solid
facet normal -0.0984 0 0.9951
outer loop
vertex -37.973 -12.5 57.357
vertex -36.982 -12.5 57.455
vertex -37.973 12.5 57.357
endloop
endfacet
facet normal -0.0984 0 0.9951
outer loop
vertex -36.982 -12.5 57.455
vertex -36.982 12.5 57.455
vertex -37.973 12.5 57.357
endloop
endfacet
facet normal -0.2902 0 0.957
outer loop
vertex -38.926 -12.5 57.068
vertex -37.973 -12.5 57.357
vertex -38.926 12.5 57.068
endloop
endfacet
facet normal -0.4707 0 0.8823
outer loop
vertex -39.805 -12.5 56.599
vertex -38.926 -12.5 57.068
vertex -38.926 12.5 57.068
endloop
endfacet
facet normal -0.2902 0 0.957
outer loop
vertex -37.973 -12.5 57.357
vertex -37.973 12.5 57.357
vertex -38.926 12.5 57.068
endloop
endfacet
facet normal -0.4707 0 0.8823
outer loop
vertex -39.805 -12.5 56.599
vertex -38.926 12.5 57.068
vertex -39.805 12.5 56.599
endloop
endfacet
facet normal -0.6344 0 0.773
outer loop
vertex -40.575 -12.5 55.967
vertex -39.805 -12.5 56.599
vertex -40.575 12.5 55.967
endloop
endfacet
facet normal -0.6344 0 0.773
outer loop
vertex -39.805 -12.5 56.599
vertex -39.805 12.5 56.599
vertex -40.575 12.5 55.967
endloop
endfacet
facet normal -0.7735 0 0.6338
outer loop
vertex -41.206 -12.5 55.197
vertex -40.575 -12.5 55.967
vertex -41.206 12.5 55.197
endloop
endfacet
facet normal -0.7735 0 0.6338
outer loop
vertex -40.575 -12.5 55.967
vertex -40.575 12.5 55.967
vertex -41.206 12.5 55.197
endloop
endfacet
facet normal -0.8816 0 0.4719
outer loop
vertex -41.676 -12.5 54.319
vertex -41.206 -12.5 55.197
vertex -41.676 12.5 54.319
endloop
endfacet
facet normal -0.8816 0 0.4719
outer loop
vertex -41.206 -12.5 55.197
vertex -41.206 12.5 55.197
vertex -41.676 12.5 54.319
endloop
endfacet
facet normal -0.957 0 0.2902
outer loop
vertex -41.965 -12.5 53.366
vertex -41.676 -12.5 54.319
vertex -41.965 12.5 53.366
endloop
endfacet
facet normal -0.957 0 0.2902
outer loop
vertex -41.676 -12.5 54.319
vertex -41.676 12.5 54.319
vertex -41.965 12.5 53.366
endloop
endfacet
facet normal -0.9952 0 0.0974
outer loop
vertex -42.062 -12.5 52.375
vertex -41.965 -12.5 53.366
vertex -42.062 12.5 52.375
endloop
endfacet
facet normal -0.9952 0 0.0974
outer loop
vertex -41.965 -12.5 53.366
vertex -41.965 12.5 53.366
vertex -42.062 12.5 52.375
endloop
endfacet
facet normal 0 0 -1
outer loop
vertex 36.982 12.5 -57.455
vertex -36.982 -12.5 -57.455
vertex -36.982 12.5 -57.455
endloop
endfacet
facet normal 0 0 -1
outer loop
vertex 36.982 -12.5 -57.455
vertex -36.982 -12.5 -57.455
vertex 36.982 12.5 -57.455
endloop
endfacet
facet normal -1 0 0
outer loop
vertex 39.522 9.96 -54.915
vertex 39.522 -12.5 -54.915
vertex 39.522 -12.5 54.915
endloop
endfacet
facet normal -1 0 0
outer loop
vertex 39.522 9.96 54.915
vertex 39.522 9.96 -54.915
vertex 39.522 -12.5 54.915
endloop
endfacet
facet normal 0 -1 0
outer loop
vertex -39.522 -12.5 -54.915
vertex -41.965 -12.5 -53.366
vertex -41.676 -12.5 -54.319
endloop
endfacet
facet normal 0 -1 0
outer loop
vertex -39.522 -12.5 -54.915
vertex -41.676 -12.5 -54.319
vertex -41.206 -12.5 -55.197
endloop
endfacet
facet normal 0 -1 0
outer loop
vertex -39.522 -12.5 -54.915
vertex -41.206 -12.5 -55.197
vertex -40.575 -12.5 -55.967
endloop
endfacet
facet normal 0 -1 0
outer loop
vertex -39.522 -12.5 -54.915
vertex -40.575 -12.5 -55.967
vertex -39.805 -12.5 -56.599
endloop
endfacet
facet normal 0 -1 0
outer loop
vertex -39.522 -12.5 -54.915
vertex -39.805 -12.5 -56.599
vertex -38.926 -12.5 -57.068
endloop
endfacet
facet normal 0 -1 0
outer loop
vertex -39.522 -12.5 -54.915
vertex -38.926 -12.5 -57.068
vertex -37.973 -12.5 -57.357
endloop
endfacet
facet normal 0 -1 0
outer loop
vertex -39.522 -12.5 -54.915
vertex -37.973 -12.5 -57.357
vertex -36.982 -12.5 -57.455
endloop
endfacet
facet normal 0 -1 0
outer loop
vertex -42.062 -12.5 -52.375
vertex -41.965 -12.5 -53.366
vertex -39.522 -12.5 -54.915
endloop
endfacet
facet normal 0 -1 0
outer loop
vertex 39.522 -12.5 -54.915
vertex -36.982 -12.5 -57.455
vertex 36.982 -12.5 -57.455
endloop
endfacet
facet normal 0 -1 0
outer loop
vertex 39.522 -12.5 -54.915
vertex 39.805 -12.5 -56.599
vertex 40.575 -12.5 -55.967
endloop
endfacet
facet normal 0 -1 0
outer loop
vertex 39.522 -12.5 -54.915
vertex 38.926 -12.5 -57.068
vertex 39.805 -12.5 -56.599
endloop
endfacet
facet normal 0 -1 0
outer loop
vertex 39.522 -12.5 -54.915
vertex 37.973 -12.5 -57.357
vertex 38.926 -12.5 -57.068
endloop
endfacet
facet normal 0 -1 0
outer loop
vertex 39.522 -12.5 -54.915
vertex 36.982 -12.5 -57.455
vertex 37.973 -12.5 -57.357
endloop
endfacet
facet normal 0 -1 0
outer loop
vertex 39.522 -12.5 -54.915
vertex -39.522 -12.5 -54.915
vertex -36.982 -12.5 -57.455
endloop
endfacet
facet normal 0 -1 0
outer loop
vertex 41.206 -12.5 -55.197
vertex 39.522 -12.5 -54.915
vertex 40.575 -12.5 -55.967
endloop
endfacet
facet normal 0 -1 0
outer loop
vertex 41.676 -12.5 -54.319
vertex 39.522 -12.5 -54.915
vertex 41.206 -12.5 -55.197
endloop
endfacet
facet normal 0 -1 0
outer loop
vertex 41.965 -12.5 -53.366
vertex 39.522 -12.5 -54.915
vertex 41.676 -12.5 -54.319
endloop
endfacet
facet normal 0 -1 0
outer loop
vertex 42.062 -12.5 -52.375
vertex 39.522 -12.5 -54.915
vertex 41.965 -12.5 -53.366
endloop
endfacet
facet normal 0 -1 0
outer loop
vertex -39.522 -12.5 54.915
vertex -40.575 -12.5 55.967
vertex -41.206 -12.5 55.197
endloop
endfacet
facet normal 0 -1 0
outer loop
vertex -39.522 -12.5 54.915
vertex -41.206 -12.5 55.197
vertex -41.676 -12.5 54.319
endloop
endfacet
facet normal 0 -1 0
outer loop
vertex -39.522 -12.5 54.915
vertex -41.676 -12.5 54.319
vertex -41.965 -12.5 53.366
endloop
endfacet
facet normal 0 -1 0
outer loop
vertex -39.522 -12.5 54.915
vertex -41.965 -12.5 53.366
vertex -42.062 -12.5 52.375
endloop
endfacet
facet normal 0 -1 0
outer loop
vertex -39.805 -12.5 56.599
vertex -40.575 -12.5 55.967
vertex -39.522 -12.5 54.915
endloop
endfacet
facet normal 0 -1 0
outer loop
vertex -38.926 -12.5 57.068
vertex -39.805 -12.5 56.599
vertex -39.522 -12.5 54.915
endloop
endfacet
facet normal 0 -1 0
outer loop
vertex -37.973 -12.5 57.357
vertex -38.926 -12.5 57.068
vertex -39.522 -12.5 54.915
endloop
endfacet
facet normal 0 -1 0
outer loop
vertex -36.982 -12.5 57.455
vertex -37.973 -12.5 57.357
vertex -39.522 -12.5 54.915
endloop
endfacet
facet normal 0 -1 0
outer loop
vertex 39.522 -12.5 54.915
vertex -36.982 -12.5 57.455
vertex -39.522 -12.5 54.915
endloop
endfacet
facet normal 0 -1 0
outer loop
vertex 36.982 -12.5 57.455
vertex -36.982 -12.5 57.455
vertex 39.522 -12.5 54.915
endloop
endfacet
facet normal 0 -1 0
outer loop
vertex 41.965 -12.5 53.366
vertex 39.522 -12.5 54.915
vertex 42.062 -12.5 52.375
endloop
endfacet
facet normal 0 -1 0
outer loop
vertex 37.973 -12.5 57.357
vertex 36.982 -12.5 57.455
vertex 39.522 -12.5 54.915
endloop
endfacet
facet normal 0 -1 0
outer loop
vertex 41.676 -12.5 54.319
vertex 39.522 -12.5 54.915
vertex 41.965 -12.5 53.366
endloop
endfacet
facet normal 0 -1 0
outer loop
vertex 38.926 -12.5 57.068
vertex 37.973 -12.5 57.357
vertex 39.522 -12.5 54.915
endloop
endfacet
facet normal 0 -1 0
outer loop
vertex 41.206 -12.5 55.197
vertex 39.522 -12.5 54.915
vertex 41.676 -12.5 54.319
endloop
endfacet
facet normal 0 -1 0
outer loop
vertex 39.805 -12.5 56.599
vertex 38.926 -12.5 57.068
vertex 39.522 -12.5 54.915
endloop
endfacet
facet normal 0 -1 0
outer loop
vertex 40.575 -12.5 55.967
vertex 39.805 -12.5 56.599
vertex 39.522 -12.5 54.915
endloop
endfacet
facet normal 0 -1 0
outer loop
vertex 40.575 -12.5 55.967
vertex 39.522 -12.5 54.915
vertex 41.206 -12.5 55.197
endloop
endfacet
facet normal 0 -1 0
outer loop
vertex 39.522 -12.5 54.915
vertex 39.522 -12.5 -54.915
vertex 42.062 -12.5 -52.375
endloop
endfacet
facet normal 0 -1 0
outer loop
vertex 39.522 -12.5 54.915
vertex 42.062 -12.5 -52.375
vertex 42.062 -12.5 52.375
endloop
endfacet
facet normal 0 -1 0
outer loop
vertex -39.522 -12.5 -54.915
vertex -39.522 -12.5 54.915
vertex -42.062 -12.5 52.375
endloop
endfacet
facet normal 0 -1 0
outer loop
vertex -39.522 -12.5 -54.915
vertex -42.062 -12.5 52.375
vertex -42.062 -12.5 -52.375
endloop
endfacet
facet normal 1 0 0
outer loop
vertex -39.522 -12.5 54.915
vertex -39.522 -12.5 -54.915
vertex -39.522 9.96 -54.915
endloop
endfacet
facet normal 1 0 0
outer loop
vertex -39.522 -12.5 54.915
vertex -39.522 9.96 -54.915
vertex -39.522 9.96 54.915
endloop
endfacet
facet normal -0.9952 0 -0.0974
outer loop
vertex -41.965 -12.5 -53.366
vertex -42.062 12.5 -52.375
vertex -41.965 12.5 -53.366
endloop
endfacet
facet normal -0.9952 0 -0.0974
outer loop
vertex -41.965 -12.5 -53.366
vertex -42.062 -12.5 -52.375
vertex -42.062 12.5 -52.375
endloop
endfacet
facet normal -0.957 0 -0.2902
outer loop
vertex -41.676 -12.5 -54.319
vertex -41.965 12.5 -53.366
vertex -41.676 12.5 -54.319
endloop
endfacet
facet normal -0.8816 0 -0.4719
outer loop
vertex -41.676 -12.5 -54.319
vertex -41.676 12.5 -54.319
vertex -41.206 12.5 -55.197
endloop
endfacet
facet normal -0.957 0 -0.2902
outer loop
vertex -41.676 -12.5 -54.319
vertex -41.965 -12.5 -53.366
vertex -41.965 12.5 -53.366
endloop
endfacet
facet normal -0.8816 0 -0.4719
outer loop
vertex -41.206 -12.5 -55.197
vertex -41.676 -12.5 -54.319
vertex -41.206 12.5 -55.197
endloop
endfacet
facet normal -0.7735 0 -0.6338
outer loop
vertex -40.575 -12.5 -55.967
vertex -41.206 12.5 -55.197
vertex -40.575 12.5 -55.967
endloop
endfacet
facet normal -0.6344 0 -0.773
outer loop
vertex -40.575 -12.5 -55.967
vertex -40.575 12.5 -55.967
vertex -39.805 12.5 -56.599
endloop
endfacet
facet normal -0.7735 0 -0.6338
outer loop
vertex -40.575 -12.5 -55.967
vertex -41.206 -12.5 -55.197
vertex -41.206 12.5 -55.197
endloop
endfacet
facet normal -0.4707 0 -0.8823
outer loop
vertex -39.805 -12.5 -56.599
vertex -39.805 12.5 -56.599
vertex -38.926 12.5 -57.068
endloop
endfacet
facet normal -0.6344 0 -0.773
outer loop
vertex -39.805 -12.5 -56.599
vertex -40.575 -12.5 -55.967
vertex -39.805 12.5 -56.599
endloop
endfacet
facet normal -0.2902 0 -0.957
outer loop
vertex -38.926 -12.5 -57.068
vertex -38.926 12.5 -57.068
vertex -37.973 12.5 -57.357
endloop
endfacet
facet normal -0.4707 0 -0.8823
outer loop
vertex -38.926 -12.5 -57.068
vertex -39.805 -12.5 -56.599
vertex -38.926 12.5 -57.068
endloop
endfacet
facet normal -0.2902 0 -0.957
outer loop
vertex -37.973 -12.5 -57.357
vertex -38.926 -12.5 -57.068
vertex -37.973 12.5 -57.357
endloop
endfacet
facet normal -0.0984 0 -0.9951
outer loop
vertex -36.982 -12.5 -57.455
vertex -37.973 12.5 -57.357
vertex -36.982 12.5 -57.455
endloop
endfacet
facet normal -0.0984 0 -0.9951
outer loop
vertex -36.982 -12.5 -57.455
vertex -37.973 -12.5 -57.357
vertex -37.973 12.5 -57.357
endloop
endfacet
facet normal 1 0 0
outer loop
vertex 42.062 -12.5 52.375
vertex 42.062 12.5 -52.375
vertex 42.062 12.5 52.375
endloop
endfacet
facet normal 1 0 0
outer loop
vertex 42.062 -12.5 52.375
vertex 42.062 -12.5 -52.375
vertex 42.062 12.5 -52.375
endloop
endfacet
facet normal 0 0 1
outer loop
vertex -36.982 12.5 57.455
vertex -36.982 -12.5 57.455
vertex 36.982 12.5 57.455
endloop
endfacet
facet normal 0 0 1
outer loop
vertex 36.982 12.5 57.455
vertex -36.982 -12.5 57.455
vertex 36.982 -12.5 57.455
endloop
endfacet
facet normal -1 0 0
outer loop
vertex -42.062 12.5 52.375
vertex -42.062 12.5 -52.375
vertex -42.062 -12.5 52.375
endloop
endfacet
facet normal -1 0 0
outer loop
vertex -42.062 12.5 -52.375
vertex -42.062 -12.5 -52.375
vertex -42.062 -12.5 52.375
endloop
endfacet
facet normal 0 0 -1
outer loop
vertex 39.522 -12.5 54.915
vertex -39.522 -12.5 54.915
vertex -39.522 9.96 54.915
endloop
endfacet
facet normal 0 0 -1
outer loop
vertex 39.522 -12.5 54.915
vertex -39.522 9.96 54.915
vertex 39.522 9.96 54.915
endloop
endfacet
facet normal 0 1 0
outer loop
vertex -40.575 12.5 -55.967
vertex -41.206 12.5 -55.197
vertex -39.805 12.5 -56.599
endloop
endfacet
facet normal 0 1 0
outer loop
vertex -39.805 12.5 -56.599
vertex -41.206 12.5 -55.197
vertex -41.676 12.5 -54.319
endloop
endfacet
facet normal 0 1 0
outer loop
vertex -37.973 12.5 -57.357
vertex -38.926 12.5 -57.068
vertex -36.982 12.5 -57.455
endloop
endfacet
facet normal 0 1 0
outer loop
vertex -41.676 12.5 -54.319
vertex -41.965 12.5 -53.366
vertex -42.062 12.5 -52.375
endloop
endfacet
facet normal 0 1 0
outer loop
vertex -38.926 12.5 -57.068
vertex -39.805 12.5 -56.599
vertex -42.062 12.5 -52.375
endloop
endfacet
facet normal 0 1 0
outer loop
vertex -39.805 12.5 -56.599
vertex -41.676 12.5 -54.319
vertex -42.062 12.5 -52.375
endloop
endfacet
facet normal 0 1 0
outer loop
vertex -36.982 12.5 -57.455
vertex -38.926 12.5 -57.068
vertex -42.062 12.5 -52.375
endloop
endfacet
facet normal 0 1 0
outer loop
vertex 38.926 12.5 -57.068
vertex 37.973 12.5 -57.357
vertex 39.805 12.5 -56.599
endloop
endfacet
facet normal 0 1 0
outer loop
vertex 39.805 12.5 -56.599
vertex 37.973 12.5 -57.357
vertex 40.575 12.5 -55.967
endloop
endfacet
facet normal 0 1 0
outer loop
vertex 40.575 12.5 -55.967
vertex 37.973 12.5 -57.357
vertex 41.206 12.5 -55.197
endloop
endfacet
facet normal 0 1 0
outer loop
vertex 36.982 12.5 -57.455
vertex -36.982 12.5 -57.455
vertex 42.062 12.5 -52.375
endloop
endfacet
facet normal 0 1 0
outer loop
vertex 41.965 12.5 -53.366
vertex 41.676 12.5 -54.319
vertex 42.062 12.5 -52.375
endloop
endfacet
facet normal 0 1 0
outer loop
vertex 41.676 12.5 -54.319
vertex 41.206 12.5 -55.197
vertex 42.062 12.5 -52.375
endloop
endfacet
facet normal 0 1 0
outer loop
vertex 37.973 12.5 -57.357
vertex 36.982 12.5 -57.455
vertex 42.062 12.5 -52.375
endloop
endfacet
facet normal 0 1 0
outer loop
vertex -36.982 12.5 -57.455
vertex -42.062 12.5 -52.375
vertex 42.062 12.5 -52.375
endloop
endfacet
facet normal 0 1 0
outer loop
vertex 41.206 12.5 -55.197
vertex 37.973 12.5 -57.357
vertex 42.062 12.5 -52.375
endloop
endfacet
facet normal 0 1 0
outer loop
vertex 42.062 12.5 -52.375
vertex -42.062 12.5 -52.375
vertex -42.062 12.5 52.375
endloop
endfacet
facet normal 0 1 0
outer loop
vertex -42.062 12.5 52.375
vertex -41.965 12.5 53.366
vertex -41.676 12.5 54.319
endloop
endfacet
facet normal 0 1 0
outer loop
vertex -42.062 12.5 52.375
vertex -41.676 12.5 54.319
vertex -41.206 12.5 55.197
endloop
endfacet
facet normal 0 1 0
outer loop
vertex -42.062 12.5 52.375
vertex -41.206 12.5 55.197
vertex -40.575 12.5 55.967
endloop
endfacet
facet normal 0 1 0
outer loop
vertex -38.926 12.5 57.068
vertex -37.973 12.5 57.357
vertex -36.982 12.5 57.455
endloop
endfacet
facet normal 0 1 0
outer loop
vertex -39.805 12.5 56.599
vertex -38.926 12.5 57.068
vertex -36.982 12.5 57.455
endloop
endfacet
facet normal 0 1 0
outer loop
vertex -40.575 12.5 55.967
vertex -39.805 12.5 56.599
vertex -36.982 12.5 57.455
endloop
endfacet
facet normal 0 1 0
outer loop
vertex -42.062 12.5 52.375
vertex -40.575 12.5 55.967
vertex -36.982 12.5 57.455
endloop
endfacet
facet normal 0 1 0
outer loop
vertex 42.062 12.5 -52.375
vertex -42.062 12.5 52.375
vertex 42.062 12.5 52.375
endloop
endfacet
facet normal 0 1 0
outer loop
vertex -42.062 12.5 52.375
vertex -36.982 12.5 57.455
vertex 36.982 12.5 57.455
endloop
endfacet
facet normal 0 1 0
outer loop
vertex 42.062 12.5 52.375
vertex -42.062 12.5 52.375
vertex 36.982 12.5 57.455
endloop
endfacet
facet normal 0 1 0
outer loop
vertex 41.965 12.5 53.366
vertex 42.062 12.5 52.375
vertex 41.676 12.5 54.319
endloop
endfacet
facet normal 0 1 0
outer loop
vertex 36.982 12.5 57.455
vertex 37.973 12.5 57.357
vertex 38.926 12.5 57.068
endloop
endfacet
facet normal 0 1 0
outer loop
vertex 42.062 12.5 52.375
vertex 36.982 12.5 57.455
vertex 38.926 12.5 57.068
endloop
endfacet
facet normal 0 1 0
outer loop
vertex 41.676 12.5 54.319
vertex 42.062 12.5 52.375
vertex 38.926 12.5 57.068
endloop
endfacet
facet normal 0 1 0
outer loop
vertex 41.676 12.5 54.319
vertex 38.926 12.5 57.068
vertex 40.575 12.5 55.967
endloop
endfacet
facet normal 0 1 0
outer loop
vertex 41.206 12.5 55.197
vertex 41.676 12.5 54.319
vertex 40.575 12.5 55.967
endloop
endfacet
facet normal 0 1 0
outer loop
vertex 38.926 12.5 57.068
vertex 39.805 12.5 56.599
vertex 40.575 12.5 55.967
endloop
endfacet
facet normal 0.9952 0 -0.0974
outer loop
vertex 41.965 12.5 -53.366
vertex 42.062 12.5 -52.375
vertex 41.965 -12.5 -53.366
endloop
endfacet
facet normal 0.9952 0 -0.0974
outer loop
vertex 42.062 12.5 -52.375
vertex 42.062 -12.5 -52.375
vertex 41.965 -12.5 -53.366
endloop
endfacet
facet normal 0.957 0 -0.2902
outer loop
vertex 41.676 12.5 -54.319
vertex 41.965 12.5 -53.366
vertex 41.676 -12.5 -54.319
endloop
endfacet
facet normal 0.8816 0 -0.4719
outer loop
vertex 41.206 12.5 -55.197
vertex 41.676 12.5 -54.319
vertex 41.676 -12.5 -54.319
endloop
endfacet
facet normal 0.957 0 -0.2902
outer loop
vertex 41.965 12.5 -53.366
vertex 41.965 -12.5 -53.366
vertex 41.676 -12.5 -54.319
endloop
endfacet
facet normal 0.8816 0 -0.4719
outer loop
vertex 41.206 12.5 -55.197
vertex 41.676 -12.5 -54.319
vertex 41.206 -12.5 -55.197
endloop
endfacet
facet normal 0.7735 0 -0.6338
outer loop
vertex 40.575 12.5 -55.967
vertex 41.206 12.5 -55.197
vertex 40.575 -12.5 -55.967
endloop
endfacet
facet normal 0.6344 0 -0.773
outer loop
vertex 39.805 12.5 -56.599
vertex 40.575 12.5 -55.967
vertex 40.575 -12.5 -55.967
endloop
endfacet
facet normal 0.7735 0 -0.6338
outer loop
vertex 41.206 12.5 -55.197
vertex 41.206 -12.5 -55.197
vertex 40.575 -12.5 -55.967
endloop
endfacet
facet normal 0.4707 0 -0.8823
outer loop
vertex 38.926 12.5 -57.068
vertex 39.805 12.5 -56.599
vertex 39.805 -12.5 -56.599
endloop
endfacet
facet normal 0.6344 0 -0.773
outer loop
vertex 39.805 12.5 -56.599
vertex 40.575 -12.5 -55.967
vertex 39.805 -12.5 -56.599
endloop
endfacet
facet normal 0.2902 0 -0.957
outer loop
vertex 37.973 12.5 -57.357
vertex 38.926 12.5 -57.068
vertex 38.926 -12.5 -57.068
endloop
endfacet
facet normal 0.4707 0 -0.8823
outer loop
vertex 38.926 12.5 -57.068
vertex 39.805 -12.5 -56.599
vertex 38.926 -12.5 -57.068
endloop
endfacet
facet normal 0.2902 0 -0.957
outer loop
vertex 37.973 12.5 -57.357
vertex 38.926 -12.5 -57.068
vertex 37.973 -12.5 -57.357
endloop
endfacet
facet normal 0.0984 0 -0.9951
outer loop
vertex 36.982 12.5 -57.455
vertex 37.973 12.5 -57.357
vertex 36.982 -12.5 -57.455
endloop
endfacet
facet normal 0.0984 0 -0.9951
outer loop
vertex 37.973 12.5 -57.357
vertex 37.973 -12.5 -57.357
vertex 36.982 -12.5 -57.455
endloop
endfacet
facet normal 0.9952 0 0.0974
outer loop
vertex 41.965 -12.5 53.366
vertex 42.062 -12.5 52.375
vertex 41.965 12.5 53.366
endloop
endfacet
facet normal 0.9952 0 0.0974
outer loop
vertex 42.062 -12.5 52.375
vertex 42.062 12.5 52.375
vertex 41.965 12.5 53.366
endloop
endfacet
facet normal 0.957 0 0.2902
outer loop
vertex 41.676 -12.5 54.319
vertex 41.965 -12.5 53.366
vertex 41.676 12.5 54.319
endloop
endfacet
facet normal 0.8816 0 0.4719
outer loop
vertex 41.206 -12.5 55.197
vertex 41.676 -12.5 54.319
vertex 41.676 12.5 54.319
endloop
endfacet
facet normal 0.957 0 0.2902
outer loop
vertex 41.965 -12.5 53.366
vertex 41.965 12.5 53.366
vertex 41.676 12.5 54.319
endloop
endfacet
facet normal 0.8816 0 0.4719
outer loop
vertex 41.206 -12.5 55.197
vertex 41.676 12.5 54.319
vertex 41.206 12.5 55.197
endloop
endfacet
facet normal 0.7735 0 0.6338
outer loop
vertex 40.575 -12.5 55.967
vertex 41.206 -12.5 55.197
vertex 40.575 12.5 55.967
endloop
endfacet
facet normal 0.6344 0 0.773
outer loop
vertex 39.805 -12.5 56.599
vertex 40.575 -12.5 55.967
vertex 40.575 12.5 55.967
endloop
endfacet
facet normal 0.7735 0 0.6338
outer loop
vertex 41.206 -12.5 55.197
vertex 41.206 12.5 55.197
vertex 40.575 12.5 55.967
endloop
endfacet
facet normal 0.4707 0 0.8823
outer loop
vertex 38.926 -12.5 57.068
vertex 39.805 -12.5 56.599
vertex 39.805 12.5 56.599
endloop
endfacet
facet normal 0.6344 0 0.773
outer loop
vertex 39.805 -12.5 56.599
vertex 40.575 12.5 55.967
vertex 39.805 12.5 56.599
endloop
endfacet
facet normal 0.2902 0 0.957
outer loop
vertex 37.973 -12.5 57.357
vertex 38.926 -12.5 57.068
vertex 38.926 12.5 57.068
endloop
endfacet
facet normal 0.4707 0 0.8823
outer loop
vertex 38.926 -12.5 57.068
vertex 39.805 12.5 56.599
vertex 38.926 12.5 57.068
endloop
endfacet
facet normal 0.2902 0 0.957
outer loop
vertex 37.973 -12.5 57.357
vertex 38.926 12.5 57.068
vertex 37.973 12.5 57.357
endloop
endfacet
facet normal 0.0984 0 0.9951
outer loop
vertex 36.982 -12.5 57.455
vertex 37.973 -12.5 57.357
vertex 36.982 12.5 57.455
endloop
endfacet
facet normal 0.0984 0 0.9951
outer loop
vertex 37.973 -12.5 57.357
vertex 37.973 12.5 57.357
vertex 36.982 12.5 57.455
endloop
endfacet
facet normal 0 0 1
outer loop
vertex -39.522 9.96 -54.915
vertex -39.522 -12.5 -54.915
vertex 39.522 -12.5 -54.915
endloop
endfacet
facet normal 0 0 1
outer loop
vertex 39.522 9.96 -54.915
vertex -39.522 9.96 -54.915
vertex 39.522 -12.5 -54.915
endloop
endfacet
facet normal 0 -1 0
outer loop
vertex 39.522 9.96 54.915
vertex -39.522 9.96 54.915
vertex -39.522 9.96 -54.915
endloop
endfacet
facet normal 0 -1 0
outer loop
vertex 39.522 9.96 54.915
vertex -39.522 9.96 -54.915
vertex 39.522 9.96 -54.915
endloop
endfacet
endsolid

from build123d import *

# Parameters (mm, degrees)
F0_W     = 84.124804
F0_H     = 114.909604
F1_DEPTH = 12.5
F2_T     = -2.54
F3_R     = 5.08


with BuildPart() as f1:
    # F0 (on Front) → F1 (new body, symmetric)
    with BuildSketch(Plane.XZ):
        Rectangle(F0_W, F0_H)
    extrude(amount=F1_DEPTH, both=True)

    # F2
    f2_openings = [f1.faces().sort_by_distance(p)[0] for p in [
        (0, -12.5, 0),
    ]]
    offset(amount=F2_T, openings=f2_openings)

    # F3
    f3_edges = [f1.edges().sort_by_distance(p)[0] for p in [
        (-42.062402, 0, 57.454802),
        (-42.062402, 0, -57.454802),
        (42.062402, 0, 57.454802),
        (42.062402, 0, -57.454802),
    ]]
    fillet(f3_edges, radius=F3_R)


solid = f1.part
